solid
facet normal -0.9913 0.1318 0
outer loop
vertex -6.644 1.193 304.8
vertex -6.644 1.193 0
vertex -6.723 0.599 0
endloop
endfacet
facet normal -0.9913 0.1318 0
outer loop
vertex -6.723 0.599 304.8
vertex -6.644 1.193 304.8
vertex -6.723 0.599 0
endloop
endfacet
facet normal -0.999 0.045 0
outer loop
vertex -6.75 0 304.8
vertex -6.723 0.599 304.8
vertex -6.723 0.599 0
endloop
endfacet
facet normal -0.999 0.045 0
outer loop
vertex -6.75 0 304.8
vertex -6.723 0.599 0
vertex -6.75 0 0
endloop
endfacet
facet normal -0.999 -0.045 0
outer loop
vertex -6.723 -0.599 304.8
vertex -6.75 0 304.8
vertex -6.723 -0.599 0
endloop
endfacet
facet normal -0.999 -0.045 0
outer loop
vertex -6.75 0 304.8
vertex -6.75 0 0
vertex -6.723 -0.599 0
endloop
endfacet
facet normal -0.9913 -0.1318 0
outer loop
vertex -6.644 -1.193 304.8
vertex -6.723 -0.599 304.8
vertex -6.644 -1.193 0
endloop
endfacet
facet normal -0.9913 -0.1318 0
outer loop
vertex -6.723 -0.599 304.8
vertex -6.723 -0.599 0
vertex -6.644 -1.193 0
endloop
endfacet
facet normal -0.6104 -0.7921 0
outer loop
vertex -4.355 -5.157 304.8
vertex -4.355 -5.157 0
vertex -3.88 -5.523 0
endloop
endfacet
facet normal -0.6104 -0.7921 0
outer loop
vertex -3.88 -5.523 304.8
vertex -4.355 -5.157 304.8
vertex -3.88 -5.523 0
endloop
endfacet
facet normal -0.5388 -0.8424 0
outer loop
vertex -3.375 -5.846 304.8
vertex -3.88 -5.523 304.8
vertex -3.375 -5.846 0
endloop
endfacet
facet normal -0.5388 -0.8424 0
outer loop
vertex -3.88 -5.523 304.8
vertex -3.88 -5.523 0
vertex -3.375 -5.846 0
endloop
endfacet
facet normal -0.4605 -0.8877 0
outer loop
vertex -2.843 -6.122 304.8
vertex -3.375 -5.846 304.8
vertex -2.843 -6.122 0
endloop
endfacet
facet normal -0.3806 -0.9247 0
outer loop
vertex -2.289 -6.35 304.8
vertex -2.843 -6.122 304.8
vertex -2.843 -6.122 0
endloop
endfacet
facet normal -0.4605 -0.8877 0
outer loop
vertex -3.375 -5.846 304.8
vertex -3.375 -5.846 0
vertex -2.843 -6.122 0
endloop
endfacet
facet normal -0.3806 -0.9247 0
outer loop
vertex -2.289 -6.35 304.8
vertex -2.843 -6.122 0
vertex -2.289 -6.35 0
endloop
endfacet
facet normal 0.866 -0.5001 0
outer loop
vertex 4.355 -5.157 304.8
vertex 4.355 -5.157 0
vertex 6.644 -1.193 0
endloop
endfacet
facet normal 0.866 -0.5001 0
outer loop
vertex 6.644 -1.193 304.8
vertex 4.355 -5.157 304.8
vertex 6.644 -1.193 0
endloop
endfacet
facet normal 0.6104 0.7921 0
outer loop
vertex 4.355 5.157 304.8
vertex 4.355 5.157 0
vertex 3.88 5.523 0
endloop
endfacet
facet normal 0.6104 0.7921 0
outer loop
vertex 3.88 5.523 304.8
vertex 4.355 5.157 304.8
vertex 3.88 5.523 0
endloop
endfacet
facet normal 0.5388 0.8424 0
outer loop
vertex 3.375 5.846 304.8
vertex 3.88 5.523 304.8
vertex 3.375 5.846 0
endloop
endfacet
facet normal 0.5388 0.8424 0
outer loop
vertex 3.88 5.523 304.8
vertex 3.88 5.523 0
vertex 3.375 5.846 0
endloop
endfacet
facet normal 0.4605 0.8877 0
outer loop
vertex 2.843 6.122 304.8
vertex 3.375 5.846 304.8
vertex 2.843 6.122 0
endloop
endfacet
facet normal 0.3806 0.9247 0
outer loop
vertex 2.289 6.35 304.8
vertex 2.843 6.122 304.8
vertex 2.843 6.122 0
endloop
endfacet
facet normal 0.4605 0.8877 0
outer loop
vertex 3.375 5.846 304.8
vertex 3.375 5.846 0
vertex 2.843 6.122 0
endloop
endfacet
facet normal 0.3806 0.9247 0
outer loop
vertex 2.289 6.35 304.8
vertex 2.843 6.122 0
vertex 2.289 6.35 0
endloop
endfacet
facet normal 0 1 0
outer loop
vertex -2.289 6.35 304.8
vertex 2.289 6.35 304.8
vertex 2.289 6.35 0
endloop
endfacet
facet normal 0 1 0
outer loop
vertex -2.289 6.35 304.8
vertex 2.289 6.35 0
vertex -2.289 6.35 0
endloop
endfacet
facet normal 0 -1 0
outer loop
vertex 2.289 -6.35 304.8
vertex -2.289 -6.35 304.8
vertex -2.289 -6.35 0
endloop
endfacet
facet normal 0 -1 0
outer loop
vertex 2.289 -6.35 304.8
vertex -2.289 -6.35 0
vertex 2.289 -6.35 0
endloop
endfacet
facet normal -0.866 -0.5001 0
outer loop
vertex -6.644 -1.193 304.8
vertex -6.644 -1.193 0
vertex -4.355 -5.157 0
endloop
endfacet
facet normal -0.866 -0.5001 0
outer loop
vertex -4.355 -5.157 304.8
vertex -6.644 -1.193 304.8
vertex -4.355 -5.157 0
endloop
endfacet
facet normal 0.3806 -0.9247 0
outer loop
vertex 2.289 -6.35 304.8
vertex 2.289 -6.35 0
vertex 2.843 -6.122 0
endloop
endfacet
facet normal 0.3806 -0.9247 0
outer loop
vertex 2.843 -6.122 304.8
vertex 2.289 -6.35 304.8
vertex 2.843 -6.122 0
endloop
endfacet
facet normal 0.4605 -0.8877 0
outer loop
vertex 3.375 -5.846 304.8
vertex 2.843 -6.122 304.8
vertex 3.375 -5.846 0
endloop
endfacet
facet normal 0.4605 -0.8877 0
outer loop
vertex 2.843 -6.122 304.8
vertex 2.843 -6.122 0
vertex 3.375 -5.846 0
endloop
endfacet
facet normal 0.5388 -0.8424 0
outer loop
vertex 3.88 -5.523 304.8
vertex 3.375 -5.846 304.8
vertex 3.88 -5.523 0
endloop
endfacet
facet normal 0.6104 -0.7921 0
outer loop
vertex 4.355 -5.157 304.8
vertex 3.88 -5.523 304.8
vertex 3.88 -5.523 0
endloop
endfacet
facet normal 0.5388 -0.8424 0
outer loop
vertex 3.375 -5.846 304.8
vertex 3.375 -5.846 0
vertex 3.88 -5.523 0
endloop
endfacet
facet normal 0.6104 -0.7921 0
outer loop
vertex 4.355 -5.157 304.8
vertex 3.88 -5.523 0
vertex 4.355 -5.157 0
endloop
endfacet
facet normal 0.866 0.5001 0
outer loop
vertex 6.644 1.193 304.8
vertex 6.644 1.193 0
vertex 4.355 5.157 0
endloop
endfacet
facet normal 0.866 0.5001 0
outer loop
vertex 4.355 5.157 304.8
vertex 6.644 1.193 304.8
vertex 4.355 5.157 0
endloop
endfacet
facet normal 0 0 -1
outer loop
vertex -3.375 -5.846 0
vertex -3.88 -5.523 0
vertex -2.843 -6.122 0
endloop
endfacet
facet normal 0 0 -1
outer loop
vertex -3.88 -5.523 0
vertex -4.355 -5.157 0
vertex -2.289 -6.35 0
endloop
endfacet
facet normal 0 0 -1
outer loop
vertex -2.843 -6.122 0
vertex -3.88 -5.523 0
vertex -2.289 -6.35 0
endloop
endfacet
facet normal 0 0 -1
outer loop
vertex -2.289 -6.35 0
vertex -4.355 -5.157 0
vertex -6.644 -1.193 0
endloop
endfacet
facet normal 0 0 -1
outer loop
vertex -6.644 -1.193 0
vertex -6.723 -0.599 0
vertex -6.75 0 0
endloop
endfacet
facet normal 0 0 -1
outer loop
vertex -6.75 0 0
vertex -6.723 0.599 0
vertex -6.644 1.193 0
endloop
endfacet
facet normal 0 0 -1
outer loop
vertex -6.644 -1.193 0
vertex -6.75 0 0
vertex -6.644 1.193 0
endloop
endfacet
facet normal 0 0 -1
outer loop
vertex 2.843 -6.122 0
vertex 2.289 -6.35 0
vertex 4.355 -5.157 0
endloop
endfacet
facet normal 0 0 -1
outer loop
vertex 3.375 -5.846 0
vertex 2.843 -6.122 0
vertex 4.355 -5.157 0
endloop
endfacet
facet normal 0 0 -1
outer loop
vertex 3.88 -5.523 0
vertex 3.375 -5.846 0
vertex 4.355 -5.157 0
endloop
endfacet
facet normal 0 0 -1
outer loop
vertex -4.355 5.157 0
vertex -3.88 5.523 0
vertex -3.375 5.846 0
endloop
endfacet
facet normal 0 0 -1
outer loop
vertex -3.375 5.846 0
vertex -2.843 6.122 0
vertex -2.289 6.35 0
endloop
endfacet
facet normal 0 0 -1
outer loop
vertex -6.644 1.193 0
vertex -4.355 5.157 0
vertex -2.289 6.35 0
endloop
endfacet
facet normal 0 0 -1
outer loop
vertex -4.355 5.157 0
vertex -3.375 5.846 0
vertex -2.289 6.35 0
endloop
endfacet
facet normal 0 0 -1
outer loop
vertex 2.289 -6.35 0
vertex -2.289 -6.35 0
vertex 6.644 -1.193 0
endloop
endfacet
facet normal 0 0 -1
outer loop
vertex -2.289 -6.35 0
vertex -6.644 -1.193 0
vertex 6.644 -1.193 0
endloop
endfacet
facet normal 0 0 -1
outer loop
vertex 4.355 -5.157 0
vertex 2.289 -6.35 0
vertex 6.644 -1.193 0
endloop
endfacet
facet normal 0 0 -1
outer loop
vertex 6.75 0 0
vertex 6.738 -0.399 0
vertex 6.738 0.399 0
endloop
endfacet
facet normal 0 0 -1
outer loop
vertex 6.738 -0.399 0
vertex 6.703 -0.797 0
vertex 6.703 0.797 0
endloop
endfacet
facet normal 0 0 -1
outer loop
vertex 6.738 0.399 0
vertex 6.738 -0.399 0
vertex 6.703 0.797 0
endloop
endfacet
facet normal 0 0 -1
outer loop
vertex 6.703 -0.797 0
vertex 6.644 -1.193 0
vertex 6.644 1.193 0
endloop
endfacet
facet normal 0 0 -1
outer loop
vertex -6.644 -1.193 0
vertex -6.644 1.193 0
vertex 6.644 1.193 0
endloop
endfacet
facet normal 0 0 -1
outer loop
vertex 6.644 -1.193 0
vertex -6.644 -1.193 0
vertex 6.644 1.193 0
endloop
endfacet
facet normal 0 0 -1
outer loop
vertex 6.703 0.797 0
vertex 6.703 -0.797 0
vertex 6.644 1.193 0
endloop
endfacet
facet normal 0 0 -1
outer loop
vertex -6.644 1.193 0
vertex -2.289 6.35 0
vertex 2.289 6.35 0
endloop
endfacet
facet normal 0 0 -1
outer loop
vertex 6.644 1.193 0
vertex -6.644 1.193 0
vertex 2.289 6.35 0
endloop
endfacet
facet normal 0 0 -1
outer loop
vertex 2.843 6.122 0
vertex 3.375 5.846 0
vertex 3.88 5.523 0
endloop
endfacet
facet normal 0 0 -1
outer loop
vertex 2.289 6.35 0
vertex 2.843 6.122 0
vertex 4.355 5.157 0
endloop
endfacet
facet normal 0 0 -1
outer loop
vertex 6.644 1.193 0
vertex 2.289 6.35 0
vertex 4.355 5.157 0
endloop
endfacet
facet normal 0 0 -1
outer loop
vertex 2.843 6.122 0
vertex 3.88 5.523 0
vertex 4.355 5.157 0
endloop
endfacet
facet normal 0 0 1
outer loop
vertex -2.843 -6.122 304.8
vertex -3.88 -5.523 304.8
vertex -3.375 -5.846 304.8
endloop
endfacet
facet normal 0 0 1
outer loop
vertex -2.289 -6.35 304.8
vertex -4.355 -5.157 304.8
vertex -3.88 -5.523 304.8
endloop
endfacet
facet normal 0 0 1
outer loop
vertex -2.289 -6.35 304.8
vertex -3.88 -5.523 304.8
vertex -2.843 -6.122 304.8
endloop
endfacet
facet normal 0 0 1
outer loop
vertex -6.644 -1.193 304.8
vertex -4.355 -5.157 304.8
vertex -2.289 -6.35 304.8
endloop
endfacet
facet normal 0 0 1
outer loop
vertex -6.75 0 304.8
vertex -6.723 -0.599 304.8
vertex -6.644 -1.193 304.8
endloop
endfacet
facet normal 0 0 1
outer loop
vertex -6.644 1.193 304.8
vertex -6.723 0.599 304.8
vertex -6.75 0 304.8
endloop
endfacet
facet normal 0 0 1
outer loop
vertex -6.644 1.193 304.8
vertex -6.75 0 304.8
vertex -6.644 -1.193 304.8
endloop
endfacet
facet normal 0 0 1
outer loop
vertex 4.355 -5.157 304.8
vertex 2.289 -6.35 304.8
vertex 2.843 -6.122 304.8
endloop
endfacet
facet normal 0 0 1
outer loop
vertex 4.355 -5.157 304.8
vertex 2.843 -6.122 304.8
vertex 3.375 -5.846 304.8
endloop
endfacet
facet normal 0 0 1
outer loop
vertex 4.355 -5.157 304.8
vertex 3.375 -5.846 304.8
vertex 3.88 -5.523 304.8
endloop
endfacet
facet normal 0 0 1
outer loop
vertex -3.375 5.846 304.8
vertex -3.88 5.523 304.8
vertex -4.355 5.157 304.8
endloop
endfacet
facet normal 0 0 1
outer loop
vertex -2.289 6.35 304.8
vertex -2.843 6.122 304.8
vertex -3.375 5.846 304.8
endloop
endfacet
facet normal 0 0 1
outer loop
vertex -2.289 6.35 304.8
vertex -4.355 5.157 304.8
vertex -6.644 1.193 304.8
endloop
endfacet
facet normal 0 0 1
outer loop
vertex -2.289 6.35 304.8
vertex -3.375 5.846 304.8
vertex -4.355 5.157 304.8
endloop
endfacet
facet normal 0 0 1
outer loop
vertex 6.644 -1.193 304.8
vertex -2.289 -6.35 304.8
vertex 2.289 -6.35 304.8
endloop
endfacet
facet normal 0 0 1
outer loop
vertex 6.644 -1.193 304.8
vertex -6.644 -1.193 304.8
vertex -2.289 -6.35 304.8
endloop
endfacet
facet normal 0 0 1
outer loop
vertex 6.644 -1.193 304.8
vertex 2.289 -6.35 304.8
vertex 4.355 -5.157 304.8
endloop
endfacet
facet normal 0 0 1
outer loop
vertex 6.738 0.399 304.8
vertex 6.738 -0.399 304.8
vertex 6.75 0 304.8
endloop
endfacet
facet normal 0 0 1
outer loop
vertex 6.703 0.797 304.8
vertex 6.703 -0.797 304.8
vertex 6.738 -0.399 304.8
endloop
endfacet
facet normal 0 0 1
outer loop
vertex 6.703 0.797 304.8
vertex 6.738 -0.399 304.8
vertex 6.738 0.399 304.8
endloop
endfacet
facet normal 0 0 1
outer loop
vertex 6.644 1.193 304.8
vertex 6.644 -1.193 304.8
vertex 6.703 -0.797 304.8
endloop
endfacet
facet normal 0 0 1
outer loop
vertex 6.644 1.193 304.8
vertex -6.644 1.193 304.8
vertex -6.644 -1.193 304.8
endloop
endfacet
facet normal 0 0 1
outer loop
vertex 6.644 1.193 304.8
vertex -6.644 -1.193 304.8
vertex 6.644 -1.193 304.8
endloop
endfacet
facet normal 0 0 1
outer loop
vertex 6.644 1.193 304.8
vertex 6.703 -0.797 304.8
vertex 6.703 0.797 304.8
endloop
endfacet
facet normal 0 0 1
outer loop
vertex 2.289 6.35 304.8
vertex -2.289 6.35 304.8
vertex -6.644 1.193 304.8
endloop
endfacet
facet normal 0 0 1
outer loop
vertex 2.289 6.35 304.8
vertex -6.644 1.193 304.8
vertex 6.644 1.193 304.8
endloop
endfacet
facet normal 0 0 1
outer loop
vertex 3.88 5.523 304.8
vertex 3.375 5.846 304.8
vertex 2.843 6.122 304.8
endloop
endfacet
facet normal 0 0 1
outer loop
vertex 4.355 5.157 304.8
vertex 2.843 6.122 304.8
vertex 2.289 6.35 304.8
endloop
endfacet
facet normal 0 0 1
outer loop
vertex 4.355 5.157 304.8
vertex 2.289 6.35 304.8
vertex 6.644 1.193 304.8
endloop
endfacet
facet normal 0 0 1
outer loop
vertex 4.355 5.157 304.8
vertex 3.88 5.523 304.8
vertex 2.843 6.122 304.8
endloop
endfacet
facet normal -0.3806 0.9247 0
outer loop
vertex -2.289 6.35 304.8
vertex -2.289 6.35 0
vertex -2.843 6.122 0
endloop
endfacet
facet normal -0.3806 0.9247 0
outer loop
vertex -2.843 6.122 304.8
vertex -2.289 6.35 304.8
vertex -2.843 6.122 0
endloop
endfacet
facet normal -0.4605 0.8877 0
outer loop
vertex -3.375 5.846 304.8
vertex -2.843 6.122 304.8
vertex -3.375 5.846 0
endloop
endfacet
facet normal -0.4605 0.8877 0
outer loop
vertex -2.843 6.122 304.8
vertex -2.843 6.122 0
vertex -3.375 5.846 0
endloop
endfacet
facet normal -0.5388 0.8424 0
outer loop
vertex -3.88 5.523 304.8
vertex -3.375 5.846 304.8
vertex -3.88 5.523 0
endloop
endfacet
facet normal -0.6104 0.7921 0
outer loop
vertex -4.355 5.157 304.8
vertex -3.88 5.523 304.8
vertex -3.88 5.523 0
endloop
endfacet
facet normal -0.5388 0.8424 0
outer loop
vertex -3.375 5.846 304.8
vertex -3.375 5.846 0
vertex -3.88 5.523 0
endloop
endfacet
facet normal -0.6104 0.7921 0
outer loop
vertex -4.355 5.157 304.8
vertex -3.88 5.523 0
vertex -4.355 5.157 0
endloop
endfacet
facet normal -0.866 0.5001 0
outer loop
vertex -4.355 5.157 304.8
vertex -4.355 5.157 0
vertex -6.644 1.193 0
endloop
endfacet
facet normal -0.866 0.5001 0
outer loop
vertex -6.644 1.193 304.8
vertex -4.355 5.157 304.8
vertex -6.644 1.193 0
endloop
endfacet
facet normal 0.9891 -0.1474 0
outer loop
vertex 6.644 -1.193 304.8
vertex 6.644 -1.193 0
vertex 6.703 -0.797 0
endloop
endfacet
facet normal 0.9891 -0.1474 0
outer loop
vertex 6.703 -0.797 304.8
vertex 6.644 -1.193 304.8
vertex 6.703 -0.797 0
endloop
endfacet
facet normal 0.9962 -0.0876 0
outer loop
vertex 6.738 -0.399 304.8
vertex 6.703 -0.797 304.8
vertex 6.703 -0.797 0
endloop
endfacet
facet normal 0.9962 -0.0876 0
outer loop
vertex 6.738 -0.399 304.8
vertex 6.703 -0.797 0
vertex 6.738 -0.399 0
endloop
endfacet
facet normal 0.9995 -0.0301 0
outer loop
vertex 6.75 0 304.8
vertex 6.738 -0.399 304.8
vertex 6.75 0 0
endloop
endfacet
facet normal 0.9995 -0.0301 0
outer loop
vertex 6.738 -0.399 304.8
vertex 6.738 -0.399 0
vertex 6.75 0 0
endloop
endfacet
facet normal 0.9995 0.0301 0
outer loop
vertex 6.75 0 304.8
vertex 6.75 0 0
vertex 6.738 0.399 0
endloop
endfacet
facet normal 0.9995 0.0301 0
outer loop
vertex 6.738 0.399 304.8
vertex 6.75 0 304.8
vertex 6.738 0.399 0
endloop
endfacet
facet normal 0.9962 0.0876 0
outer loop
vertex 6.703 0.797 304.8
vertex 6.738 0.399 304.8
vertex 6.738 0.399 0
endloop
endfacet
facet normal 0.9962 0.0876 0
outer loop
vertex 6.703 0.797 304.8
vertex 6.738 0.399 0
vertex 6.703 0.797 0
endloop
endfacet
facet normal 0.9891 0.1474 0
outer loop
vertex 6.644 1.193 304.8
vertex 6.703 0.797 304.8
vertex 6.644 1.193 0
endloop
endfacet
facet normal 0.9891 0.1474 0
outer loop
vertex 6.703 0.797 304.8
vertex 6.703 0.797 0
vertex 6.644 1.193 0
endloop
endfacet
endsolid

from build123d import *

# Parameters (mm, degrees)
BOSS_EXTRUDE1_DEPTH = 304.8


with BuildPart() as part:
    # Sketch1 → Boss-Extrude1 (new body)
    with BuildSketch(Plane.XY):
        with BuildLine():
            ThreePointArc((-6.643813628, 1.19257724), (-6.75, 0), (-6.643813628, -1.19257724))
            Line((-6.643813628, -1.19257724), (-4.354709, -5.15742276))
            ThreePointArc((-4.354709, -5.15742276), (-3.375, -5.845671476), (-2.289104628, -6.35))
            Line((-2.289104628, -6.35), (2.289104628, -6.35))
            ThreePointArc((2.289104628, -6.35), (3.375, -5.845671476), (4.354709, -5.15742276))
            Line((4.354709, -5.15742276), (6.643813628, -1.19257724))
            ThreePointArc((6.643813628, -1.19257724), (6.723400999, -0.598647646), (6.75, 0))
            ThreePointArc((6.75, 0), (6.723400999, 0.598647646), (6.643813628, 1.19257724))
            Line((6.643813628, 1.19257724), (4.354709, 5.15742276))
            ThreePointArc((4.354709, 5.15742276), (3.375, 5.845671476), (2.289104628, 6.35))
            Line((2.289104628, 6.35), (-2.289104628, 6.35))
            ThreePointArc((-2.289104628, 6.35), (-3.375, 5.845671476), (-4.354709, 5.15742276))
            Line((-4.354709, 5.15742276), (-6.643813628, 1.19257724))
        make_face()
    extrude(amount=BOSS_EXTRUDE1_DEPTH)


solid = part.part
